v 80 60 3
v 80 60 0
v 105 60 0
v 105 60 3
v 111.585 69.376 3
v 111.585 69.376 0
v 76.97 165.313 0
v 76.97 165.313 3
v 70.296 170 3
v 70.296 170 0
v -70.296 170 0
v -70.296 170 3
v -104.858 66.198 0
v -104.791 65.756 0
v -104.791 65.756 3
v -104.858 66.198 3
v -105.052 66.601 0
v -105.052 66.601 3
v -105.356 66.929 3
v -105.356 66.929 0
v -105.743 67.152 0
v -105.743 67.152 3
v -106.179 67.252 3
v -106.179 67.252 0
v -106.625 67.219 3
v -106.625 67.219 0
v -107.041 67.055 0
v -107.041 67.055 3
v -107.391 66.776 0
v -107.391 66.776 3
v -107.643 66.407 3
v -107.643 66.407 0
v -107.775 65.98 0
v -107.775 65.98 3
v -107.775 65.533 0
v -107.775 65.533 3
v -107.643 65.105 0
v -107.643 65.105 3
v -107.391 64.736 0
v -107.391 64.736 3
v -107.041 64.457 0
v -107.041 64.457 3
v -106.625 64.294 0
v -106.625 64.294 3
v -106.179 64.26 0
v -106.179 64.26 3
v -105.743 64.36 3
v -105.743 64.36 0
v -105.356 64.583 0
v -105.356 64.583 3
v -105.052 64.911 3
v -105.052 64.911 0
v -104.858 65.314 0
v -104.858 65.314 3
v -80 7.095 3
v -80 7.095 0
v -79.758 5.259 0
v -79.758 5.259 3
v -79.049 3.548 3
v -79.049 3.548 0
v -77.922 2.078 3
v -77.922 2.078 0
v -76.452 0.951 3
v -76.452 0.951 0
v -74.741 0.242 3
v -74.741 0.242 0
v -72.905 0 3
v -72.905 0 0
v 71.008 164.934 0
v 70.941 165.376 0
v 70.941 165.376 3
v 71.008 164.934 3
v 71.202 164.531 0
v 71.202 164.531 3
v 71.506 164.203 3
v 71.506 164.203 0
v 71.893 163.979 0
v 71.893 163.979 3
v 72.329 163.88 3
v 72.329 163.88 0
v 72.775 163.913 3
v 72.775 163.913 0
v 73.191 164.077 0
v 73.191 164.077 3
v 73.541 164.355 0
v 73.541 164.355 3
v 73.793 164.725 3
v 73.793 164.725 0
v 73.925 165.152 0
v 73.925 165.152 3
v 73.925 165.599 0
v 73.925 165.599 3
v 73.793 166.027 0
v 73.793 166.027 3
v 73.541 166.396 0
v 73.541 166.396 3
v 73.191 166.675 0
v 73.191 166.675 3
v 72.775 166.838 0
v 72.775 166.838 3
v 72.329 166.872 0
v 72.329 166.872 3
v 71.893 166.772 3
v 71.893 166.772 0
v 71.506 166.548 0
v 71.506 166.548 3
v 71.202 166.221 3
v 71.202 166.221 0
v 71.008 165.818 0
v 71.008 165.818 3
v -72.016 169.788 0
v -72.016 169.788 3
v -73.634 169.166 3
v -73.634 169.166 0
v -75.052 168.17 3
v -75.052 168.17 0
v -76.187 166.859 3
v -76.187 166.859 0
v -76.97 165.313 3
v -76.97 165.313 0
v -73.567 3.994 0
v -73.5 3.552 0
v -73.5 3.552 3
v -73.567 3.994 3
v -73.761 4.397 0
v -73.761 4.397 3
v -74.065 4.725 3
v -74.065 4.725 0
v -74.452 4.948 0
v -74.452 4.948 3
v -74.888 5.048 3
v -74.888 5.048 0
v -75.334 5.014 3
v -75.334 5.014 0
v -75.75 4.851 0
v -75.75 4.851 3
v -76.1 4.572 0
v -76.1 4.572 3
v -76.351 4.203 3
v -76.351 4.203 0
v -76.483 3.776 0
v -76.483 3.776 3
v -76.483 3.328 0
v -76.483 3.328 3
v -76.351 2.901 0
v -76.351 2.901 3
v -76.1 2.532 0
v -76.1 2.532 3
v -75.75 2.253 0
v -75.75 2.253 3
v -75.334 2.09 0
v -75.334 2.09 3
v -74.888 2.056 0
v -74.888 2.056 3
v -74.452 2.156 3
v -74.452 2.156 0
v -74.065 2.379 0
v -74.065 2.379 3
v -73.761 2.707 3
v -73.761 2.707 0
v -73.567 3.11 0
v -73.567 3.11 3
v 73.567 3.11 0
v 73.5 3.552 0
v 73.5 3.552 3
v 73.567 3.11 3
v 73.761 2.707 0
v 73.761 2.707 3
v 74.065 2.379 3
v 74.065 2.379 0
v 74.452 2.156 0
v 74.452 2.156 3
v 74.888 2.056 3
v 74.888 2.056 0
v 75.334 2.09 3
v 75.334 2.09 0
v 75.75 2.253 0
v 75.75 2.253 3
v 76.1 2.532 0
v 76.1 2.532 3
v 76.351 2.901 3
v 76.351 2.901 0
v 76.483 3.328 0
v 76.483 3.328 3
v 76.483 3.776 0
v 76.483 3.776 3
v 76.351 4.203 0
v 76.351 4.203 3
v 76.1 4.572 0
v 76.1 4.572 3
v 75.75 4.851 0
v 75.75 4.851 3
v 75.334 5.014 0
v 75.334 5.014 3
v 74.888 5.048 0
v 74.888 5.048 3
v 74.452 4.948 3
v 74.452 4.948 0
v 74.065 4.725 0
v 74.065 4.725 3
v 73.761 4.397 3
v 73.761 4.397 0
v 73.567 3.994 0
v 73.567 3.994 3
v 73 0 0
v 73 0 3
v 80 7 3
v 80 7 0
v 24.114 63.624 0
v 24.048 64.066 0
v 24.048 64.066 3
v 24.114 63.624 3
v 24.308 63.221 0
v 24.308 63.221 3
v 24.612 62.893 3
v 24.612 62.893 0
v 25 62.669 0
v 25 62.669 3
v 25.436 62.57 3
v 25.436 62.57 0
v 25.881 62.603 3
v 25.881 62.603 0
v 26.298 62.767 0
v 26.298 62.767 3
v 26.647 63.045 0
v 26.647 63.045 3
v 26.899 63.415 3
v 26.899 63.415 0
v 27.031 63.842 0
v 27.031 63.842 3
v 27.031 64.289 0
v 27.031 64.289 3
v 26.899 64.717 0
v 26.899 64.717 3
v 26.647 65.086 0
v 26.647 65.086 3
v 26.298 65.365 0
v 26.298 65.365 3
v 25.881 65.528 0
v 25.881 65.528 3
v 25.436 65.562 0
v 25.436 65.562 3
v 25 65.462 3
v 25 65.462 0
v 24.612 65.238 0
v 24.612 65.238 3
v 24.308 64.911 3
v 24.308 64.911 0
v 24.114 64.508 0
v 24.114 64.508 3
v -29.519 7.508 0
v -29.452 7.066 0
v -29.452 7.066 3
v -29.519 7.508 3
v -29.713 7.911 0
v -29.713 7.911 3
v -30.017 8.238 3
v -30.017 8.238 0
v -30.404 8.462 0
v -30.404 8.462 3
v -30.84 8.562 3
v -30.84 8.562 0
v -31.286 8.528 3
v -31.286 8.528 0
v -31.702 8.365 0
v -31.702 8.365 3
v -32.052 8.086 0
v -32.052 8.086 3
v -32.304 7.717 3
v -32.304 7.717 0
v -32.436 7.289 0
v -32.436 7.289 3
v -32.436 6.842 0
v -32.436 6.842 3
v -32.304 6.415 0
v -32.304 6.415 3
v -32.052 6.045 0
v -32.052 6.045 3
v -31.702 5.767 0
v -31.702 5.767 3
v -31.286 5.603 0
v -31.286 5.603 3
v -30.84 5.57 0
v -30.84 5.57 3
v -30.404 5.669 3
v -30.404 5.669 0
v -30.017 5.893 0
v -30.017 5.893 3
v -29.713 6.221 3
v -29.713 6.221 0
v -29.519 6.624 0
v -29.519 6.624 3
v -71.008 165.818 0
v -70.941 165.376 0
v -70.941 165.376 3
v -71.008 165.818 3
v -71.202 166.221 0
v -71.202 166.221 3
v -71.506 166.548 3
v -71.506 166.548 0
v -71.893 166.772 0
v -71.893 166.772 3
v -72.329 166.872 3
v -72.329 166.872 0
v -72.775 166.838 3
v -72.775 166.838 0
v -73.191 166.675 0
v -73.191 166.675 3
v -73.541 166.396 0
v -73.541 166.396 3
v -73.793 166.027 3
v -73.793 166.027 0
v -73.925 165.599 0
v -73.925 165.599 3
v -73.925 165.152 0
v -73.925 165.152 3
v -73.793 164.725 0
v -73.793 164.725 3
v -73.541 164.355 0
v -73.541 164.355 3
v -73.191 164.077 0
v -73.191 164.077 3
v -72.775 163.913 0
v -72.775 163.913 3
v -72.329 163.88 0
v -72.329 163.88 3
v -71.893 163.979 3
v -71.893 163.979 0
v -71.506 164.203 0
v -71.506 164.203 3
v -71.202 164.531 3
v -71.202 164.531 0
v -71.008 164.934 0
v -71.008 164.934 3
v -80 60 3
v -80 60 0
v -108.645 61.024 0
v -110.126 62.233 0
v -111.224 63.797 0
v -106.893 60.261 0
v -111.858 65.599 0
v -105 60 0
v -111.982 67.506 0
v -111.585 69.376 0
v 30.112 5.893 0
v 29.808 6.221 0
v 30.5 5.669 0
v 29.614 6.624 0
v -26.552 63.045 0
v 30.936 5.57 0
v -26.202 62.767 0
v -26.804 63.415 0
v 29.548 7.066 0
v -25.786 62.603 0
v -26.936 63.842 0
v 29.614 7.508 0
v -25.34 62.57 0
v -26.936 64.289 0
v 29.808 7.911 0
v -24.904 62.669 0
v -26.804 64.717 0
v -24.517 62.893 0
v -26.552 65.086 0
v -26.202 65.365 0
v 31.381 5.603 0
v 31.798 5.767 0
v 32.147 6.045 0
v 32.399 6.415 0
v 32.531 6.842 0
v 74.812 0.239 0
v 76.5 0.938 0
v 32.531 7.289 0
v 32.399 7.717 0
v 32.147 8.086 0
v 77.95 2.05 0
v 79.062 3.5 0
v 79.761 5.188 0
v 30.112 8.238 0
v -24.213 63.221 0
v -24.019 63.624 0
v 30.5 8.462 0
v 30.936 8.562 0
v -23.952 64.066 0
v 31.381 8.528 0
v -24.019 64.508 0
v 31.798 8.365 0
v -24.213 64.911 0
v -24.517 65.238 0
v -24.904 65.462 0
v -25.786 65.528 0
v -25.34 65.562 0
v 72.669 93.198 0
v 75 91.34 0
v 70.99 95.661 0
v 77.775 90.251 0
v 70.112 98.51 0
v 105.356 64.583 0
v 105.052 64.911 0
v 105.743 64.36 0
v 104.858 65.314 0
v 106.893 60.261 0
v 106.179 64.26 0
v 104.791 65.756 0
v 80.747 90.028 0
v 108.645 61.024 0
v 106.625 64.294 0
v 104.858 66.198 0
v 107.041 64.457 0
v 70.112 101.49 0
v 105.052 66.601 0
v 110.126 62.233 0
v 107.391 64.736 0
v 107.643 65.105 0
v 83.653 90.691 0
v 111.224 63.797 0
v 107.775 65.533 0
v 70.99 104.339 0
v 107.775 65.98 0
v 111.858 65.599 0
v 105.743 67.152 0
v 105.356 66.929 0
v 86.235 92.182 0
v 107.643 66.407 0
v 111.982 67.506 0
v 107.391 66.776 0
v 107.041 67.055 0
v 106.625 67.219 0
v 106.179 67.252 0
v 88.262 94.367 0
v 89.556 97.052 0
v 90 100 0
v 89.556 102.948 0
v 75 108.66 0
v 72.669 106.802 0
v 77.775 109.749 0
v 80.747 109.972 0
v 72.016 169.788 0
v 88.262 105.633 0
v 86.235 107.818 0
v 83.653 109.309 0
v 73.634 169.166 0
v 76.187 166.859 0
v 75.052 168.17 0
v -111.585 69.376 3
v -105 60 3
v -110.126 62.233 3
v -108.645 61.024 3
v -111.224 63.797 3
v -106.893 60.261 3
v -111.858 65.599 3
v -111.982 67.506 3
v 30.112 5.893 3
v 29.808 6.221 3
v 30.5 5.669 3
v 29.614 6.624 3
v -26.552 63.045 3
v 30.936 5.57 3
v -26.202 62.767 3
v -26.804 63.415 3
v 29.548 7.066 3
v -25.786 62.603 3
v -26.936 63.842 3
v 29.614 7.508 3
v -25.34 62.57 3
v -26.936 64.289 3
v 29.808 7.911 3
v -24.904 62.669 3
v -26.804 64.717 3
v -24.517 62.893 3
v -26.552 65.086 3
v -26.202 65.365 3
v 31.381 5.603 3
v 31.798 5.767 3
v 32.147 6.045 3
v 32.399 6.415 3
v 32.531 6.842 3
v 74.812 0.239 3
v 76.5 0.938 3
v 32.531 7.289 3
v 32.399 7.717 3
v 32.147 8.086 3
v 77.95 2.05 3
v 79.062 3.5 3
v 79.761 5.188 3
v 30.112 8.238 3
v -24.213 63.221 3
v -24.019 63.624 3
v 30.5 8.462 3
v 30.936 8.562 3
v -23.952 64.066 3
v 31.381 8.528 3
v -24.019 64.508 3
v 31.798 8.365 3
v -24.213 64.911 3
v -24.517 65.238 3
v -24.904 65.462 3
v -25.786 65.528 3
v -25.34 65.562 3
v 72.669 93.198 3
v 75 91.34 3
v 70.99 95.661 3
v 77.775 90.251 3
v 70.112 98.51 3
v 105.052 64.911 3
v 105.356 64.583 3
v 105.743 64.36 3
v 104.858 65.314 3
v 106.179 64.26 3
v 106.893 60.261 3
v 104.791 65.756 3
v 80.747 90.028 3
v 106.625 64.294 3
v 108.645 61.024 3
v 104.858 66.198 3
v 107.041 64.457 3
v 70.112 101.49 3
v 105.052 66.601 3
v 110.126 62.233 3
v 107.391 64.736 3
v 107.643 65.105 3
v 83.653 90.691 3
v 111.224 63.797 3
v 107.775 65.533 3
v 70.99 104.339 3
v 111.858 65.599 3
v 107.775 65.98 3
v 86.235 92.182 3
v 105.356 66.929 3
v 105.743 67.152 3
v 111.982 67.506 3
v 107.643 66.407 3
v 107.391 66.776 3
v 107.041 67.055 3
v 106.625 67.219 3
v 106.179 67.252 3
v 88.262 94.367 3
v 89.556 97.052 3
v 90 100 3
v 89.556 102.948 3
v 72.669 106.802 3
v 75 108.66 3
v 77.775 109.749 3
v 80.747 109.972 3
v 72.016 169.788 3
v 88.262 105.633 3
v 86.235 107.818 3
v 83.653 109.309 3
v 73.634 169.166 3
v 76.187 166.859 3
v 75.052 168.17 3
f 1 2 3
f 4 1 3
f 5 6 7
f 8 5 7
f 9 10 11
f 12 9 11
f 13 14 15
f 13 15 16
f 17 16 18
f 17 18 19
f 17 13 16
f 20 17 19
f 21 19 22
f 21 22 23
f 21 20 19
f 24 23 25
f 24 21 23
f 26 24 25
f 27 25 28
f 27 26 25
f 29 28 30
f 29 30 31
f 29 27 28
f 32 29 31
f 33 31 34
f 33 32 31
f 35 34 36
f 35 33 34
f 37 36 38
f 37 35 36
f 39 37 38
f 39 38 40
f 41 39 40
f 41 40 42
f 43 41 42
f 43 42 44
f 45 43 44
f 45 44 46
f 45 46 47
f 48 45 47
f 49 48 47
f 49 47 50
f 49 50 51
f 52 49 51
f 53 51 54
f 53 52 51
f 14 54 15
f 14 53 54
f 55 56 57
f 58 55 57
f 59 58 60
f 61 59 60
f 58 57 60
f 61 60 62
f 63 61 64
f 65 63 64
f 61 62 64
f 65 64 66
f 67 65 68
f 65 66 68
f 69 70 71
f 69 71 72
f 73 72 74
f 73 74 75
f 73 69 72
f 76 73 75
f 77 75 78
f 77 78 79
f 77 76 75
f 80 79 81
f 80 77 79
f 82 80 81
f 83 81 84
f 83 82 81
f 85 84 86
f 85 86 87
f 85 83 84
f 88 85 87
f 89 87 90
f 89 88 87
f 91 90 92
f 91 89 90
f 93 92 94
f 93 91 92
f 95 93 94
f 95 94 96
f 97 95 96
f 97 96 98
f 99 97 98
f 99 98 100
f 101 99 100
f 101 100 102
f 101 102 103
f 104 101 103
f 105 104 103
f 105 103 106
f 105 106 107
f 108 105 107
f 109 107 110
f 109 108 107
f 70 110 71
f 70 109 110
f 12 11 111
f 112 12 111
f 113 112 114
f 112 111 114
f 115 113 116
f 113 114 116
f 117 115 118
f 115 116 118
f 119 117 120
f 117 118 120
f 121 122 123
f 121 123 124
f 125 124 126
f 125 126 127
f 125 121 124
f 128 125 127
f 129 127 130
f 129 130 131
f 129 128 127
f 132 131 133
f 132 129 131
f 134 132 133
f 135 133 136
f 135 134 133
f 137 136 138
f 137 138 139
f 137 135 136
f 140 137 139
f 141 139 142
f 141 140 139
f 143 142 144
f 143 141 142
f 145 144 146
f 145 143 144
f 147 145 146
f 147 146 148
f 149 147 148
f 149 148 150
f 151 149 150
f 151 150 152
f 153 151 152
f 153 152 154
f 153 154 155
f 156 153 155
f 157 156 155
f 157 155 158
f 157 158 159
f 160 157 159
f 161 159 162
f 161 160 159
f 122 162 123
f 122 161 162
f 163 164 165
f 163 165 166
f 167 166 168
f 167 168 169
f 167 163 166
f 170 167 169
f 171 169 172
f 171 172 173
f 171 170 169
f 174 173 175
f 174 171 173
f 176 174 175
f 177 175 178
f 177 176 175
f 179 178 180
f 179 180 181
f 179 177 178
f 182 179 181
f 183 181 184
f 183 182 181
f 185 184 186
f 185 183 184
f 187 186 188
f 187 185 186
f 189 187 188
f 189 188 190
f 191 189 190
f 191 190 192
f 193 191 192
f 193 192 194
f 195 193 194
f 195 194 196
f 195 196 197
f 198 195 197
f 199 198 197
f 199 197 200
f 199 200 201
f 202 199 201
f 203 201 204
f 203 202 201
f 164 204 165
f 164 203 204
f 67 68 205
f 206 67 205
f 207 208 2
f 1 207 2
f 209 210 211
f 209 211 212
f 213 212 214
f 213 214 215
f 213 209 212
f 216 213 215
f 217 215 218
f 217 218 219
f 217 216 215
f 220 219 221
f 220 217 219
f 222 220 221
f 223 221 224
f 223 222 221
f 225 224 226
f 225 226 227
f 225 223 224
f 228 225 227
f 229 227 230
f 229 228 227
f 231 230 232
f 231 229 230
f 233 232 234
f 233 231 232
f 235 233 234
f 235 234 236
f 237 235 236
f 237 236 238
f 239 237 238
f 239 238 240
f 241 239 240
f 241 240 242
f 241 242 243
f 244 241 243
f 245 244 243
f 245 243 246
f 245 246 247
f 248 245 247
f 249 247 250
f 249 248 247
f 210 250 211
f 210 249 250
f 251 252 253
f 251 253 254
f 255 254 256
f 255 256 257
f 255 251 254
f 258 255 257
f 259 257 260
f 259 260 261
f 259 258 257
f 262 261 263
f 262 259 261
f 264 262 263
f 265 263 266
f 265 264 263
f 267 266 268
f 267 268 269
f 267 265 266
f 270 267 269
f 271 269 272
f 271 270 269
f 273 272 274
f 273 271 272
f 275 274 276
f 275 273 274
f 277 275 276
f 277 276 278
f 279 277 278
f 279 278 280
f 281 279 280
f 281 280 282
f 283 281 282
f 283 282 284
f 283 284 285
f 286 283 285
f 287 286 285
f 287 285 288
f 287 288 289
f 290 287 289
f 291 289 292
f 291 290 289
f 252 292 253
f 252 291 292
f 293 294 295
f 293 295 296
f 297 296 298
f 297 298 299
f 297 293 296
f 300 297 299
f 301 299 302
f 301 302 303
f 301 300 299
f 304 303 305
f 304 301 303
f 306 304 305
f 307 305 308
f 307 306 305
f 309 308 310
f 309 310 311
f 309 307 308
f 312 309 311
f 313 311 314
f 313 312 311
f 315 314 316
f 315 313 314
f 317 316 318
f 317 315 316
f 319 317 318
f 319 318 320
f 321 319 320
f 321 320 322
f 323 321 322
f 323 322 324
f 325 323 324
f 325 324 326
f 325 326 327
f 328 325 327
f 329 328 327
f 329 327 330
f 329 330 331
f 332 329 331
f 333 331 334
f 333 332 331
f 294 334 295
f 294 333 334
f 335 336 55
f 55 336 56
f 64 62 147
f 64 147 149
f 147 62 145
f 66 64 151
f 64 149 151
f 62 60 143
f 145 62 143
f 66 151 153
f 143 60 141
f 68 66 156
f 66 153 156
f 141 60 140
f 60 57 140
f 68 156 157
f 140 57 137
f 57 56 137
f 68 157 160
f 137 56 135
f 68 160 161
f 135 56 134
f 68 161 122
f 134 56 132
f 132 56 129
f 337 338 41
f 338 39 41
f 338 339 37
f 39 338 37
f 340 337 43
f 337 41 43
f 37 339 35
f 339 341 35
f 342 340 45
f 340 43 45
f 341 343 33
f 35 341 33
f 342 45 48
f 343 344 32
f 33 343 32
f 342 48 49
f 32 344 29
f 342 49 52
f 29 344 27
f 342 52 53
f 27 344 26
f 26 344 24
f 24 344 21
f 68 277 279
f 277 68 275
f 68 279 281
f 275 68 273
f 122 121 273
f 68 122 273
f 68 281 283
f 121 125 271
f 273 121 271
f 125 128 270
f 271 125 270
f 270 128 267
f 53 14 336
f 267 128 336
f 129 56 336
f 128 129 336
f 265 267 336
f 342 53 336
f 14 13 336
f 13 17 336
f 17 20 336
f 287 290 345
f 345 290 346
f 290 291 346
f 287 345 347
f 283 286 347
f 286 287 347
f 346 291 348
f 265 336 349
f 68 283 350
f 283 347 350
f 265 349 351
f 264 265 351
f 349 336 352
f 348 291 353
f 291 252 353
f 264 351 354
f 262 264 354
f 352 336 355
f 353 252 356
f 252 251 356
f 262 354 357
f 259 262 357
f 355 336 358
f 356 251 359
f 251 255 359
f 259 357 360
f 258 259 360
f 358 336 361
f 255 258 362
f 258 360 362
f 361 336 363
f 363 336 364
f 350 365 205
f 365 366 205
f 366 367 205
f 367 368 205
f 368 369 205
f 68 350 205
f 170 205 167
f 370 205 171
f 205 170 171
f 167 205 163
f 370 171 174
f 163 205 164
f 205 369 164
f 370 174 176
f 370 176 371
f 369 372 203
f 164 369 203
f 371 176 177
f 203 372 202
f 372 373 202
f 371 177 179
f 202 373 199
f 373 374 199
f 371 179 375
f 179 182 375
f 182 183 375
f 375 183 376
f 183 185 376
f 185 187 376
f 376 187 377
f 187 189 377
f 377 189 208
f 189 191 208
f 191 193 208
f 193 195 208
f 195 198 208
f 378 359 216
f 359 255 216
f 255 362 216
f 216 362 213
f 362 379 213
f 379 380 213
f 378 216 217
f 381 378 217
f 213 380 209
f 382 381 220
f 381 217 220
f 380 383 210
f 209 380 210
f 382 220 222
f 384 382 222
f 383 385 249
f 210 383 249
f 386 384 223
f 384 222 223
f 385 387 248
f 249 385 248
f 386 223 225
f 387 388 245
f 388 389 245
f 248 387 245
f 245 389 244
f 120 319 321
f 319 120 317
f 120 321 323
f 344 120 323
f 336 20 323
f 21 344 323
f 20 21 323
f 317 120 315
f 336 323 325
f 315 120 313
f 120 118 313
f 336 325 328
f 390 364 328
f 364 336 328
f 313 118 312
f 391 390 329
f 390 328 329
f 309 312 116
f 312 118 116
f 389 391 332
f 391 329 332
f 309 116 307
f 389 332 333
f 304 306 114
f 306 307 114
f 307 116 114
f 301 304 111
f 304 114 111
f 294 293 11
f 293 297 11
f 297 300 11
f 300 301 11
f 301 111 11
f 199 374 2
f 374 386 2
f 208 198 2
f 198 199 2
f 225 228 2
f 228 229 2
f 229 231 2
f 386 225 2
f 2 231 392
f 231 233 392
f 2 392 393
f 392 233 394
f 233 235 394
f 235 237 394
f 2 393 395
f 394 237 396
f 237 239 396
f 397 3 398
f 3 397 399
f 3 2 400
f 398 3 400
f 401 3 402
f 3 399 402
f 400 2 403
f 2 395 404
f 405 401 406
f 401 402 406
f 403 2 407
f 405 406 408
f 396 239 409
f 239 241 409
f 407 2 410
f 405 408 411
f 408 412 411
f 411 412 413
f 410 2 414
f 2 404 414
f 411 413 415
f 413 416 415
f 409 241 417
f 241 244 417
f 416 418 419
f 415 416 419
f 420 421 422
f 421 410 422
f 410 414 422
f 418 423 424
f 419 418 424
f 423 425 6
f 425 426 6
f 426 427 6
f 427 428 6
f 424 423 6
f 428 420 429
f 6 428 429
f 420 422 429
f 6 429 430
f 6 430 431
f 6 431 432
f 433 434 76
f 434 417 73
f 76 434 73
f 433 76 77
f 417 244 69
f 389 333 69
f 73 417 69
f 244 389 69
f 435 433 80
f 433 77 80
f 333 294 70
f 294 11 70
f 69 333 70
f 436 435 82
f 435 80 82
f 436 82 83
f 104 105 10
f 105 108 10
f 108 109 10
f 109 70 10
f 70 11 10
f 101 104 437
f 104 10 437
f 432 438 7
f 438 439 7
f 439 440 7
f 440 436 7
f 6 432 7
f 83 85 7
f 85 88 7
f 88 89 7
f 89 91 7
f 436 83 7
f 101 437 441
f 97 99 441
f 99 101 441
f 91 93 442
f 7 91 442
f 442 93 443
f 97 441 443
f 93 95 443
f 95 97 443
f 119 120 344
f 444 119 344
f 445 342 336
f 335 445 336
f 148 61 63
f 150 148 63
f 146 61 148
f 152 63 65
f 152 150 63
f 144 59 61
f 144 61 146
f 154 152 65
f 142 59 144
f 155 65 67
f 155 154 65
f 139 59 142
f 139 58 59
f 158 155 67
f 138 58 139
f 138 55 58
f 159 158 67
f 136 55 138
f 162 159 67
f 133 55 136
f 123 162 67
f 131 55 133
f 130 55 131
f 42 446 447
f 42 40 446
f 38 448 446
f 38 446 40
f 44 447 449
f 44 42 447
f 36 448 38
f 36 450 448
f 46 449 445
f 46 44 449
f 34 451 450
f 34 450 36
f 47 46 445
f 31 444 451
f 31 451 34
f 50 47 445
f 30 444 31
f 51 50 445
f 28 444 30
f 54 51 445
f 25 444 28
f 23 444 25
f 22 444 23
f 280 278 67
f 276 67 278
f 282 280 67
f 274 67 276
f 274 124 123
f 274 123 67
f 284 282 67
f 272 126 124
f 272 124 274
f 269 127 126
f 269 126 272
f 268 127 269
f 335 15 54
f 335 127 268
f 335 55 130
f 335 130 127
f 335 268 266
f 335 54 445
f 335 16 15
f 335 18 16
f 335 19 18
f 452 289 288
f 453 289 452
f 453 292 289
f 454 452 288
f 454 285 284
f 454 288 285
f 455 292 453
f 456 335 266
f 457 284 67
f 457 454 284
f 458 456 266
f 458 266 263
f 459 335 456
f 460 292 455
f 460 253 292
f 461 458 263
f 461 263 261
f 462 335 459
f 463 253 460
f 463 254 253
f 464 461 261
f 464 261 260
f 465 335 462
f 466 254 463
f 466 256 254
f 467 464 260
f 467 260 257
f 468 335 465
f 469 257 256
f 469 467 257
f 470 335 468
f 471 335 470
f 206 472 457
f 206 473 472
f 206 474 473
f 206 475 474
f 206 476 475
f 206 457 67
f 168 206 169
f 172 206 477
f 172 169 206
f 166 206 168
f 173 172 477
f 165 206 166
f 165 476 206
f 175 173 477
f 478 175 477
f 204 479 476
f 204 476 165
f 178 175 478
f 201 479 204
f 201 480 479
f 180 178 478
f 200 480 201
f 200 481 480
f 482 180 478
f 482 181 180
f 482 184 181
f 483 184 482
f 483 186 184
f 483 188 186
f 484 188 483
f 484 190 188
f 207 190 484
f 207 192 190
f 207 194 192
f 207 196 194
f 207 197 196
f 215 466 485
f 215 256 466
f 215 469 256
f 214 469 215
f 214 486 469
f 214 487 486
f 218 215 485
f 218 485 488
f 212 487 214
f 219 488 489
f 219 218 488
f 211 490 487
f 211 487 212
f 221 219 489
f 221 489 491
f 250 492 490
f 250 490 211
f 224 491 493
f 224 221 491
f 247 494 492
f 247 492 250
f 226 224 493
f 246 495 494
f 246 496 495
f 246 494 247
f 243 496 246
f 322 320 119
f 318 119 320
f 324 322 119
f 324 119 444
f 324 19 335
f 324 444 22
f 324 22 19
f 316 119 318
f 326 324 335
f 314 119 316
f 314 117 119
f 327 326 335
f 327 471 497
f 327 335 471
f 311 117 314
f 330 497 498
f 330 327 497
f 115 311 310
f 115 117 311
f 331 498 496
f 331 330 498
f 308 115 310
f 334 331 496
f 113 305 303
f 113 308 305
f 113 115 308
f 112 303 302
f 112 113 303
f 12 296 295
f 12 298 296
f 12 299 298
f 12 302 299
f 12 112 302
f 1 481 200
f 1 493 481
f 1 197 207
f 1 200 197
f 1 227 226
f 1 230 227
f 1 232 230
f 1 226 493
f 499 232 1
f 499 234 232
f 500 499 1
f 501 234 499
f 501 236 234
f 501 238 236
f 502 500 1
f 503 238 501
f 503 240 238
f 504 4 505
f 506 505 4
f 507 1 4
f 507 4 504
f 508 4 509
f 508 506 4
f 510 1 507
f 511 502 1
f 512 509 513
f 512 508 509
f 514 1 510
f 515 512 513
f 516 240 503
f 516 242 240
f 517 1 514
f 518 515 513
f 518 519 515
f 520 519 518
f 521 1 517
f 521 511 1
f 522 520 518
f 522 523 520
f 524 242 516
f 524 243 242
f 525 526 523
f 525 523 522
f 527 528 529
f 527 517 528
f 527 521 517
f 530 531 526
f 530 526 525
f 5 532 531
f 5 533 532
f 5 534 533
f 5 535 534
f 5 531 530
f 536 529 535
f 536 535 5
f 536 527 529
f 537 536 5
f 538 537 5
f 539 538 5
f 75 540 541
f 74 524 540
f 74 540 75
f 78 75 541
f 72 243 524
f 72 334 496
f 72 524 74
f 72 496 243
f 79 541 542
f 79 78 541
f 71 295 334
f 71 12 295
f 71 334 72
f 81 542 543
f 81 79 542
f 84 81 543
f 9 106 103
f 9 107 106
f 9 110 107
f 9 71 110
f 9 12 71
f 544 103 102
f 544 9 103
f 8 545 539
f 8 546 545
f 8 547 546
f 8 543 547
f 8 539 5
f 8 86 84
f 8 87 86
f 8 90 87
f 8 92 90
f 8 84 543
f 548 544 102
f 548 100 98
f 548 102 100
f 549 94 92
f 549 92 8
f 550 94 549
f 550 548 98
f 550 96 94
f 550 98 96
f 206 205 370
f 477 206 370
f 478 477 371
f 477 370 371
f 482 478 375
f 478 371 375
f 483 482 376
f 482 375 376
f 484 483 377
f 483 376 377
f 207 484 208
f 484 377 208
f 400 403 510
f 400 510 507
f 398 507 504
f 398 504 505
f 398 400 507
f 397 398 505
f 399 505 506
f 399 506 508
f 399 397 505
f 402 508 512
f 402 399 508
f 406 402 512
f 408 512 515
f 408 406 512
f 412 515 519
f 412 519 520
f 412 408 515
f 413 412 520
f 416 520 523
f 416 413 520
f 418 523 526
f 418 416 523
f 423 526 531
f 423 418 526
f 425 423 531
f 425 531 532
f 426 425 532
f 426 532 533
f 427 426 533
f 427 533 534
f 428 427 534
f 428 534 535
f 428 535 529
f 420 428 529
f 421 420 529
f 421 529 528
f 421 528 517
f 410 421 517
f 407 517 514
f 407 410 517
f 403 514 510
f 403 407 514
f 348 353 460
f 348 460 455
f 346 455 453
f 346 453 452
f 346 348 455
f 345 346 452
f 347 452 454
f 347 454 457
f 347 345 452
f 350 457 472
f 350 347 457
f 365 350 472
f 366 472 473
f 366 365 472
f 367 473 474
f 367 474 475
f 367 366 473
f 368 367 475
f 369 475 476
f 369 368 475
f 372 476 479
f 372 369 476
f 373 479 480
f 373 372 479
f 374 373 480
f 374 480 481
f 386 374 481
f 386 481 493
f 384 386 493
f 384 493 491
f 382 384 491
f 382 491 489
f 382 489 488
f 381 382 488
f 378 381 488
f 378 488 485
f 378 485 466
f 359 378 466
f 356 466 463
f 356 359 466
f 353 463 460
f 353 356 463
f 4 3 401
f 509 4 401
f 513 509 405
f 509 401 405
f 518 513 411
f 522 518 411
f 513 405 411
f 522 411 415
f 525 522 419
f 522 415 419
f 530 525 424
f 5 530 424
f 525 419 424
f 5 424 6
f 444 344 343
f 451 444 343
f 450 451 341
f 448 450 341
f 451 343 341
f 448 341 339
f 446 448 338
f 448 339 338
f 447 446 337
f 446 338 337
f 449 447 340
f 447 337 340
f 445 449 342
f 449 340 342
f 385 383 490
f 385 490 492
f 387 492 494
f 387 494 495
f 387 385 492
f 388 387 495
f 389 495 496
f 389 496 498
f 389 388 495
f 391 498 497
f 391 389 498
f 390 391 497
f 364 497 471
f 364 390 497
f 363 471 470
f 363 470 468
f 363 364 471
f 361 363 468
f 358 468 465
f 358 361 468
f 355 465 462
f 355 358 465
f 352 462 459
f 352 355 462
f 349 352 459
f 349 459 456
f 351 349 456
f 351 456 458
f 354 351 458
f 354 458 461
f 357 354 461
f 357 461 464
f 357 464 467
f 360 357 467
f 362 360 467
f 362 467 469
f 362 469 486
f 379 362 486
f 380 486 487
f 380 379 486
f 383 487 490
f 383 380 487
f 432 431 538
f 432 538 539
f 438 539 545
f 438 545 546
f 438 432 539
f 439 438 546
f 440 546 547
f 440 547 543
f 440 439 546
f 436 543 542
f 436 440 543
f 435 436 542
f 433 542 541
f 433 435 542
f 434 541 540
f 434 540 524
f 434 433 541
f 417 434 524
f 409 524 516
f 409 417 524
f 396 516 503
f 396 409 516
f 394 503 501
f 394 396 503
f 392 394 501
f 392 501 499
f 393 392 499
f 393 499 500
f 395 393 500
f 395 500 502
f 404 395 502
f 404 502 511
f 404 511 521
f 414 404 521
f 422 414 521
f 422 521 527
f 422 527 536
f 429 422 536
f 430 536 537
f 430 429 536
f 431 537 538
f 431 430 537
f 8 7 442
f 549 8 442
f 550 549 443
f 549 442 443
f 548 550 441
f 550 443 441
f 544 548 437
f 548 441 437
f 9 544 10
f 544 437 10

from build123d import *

# Parameters (mm, degrees)
SKETCH_2_R      = 1.5
SKETCH_2_R_2    = 10
EXTRUDE_2_DEPTH = 3


with BuildPart() as part:
    # 草图2 → 凸台-拉伸2 (new body)
    with BuildSketch(Plane.XY):
        with BuildLine():
            Line((-72.904615241, 0), (73, 0))
            ThreePointArc((73, 0), (77.949747468, 2.050252532), (80, 7))
            Line((80, 7), (80, 60))
            Line((80, 60), (105, 60))
            ThreePointArc((105, 60), (110.7284389, 62.976942983), (111.584524662, 69.375717782))
            Line((111.584524662, 69.375717782), (76.970149392, 165.31270549))
            ThreePointArc((76.970149392, 165.31270549), (74.373778179, 168.711112108), (70.295901401, 170))
            Line((70.295901401, 170), (-70.295901401, 170))
            ThreePointArc((-70.295901401, 170), (-74.373778179, 168.711112108), (-76.970149392, 165.31270549))
            Line((-76.970149392, 165.31270549), (-111.584524662, 69.375717782))
            ThreePointArc((-111.584524662, 69.375717782), (-110.7284389, 62.976942983), (-105, 60))
            Line((-105, 60), (-80, 60))
            Line((-80, 60), (-80, 7.095384759))
            ThreePointArc((-80, 7.095384759), (-77.921809919, 2.078190081), (-72.904615241, 0))
        make_face()
        with Locations((-30.952307621, 7.065749953)):
            Circle(SKETCH_2_R, mode=Mode.SUBTRACT)
        with Locations(Location((31.047692379, 7.065749953, 0), (0, 0, 180))):
            Circle(SKETCH_2_R, mode=Mode.SUBTRACT)
        with Locations((-25.452307621, 64.065749953)):
            Circle(SKETCH_2_R, mode=Mode.SUBTRACT)
        with Locations(Location((25.547692379, 64.065749953, 0), (0, 0, 180))):
            Circle(SKETCH_2_R, mode=Mode.SUBTRACT)
        with Locations((-72.441382232, 165.375717782)):
            Circle(SKETCH_2_R, mode=Mode.SUBTRACT)
        with Locations((-106.29148568, 65.75613767)):
            Circle(SKETCH_2_R, mode=Mode.SUBTRACT)
        with Locations(Location((106.29148568, 65.75613767, 0), (0, 0, 180))):
            Circle(SKETCH_2_R, mode=Mode.SUBTRACT)
        with Locations(Location((72.441382232, 165.375717782, 0), (0, 0, 180))):
            Circle(SKETCH_2_R, mode=Mode.SUBTRACT)
        with Locations((-75, 3.552033702)):
            Circle(SKETCH_2_R, mode=Mode.SUBTRACT)
        with Locations(Location((75, 3.552033702, 0), (0, 0, 180))):
            Circle(SKETCH_2_R, mode=Mode.SUBTRACT)
        with Locations((80, 100)):
            Circle(SKETCH_2_R_2, mode=Mode.SUBTRACT)
    extrude(amount=EXTRUDE_2_DEPTH)


solid = part.part
